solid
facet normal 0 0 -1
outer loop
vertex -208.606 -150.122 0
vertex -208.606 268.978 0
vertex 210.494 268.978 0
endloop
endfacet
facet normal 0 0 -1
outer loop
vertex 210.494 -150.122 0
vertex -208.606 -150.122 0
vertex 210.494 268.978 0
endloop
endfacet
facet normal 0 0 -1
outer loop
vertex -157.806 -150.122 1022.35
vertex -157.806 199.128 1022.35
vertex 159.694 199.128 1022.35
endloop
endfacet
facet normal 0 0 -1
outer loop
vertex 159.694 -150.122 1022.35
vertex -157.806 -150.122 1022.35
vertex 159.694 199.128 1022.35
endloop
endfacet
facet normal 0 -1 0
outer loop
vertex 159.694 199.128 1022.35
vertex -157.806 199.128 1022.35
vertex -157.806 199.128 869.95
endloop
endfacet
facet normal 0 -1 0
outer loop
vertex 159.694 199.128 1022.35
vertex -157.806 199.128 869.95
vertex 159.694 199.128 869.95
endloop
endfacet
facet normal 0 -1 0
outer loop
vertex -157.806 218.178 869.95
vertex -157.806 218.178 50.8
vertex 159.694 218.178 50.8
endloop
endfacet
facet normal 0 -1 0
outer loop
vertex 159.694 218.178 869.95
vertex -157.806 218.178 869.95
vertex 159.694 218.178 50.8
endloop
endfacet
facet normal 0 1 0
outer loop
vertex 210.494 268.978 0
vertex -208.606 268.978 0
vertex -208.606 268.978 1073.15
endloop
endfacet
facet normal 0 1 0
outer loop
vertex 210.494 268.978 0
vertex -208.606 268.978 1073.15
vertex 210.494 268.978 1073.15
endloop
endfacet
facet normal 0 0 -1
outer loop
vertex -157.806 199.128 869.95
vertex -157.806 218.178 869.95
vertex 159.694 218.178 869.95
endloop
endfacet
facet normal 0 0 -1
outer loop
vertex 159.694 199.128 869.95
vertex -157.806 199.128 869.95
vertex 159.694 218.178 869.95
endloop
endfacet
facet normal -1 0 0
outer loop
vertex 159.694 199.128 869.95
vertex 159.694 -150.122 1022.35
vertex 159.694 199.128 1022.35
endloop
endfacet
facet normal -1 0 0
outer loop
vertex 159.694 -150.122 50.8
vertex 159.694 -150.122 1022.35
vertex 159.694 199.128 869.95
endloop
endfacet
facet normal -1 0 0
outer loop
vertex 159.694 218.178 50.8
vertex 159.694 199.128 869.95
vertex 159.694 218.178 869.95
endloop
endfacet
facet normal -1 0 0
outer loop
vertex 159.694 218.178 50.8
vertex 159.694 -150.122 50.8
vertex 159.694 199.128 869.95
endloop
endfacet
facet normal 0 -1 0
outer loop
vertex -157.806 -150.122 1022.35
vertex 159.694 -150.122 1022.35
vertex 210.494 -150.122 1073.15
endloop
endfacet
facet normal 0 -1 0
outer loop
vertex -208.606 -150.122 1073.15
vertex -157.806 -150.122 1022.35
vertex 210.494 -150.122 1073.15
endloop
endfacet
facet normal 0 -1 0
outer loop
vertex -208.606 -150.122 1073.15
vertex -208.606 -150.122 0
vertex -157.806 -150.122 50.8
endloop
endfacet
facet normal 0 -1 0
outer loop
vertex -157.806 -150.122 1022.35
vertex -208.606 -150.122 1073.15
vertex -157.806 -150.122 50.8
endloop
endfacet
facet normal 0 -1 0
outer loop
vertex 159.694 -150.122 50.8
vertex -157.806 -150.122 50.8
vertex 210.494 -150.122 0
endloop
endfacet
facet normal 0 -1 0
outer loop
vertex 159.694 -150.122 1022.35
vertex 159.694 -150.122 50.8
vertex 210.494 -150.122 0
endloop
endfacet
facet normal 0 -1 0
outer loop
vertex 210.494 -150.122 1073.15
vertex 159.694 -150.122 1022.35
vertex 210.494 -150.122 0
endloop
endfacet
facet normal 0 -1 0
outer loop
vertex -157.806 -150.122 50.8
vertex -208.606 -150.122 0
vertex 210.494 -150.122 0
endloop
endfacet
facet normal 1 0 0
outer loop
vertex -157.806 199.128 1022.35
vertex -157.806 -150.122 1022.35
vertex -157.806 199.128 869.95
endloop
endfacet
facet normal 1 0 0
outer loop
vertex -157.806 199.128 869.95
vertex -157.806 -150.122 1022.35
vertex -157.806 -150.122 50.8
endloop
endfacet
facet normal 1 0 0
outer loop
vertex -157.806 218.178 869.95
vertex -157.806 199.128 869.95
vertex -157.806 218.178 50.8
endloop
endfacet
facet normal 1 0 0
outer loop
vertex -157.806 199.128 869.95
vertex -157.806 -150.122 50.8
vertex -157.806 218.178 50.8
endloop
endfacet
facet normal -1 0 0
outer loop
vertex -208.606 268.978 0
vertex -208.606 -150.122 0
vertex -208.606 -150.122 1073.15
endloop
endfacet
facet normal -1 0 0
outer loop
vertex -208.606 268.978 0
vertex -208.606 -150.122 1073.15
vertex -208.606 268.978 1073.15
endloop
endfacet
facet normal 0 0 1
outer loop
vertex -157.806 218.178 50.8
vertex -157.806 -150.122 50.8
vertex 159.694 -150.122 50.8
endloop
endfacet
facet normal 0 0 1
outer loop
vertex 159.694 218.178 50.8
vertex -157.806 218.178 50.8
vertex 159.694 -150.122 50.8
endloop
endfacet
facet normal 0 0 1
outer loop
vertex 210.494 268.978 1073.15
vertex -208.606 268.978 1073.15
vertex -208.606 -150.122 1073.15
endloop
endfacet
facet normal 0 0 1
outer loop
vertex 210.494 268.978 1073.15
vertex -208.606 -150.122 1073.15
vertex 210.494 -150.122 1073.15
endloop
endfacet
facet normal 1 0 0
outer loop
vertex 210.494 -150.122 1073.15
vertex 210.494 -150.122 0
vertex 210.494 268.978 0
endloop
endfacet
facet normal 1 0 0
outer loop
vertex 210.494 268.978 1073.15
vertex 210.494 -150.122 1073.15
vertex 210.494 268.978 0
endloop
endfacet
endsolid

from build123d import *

# Parameters (mm, degrees)
F0_W     = 419.1
F0_H     = 419.1
F1_DEPTH = 1073.15
F2_T     = -50.8
F3_W     = 317.5
F3_H     = 152.4
F4_DEPTH = 19.05


with BuildPart() as f1:
    # F0 (on Top) → F1 (new body)
    with BuildSketch(Plane.XY):
        with Locations((0.943545, 59.428082)):
            Rectangle(F0_W, F0_H)
    extrude(amount=F1_DEPTH)

    # F2
    f2_openings = [f1.faces().sort_by_distance(p)[0] for p in [
        (0.943545, -150.121918, 536.575),
    ]]
    offset(amount=F2_T, openings=f2_openings)

    # F3 (on face) → F4 (join)
    with BuildSketch(Plane.XZ.offset(-218.178082)):
        with Locations((0.943545, 946.15)):
            Rectangle(F3_W, F3_H)
    extrude(amount=F4_DEPTH)


solid = f1.part
